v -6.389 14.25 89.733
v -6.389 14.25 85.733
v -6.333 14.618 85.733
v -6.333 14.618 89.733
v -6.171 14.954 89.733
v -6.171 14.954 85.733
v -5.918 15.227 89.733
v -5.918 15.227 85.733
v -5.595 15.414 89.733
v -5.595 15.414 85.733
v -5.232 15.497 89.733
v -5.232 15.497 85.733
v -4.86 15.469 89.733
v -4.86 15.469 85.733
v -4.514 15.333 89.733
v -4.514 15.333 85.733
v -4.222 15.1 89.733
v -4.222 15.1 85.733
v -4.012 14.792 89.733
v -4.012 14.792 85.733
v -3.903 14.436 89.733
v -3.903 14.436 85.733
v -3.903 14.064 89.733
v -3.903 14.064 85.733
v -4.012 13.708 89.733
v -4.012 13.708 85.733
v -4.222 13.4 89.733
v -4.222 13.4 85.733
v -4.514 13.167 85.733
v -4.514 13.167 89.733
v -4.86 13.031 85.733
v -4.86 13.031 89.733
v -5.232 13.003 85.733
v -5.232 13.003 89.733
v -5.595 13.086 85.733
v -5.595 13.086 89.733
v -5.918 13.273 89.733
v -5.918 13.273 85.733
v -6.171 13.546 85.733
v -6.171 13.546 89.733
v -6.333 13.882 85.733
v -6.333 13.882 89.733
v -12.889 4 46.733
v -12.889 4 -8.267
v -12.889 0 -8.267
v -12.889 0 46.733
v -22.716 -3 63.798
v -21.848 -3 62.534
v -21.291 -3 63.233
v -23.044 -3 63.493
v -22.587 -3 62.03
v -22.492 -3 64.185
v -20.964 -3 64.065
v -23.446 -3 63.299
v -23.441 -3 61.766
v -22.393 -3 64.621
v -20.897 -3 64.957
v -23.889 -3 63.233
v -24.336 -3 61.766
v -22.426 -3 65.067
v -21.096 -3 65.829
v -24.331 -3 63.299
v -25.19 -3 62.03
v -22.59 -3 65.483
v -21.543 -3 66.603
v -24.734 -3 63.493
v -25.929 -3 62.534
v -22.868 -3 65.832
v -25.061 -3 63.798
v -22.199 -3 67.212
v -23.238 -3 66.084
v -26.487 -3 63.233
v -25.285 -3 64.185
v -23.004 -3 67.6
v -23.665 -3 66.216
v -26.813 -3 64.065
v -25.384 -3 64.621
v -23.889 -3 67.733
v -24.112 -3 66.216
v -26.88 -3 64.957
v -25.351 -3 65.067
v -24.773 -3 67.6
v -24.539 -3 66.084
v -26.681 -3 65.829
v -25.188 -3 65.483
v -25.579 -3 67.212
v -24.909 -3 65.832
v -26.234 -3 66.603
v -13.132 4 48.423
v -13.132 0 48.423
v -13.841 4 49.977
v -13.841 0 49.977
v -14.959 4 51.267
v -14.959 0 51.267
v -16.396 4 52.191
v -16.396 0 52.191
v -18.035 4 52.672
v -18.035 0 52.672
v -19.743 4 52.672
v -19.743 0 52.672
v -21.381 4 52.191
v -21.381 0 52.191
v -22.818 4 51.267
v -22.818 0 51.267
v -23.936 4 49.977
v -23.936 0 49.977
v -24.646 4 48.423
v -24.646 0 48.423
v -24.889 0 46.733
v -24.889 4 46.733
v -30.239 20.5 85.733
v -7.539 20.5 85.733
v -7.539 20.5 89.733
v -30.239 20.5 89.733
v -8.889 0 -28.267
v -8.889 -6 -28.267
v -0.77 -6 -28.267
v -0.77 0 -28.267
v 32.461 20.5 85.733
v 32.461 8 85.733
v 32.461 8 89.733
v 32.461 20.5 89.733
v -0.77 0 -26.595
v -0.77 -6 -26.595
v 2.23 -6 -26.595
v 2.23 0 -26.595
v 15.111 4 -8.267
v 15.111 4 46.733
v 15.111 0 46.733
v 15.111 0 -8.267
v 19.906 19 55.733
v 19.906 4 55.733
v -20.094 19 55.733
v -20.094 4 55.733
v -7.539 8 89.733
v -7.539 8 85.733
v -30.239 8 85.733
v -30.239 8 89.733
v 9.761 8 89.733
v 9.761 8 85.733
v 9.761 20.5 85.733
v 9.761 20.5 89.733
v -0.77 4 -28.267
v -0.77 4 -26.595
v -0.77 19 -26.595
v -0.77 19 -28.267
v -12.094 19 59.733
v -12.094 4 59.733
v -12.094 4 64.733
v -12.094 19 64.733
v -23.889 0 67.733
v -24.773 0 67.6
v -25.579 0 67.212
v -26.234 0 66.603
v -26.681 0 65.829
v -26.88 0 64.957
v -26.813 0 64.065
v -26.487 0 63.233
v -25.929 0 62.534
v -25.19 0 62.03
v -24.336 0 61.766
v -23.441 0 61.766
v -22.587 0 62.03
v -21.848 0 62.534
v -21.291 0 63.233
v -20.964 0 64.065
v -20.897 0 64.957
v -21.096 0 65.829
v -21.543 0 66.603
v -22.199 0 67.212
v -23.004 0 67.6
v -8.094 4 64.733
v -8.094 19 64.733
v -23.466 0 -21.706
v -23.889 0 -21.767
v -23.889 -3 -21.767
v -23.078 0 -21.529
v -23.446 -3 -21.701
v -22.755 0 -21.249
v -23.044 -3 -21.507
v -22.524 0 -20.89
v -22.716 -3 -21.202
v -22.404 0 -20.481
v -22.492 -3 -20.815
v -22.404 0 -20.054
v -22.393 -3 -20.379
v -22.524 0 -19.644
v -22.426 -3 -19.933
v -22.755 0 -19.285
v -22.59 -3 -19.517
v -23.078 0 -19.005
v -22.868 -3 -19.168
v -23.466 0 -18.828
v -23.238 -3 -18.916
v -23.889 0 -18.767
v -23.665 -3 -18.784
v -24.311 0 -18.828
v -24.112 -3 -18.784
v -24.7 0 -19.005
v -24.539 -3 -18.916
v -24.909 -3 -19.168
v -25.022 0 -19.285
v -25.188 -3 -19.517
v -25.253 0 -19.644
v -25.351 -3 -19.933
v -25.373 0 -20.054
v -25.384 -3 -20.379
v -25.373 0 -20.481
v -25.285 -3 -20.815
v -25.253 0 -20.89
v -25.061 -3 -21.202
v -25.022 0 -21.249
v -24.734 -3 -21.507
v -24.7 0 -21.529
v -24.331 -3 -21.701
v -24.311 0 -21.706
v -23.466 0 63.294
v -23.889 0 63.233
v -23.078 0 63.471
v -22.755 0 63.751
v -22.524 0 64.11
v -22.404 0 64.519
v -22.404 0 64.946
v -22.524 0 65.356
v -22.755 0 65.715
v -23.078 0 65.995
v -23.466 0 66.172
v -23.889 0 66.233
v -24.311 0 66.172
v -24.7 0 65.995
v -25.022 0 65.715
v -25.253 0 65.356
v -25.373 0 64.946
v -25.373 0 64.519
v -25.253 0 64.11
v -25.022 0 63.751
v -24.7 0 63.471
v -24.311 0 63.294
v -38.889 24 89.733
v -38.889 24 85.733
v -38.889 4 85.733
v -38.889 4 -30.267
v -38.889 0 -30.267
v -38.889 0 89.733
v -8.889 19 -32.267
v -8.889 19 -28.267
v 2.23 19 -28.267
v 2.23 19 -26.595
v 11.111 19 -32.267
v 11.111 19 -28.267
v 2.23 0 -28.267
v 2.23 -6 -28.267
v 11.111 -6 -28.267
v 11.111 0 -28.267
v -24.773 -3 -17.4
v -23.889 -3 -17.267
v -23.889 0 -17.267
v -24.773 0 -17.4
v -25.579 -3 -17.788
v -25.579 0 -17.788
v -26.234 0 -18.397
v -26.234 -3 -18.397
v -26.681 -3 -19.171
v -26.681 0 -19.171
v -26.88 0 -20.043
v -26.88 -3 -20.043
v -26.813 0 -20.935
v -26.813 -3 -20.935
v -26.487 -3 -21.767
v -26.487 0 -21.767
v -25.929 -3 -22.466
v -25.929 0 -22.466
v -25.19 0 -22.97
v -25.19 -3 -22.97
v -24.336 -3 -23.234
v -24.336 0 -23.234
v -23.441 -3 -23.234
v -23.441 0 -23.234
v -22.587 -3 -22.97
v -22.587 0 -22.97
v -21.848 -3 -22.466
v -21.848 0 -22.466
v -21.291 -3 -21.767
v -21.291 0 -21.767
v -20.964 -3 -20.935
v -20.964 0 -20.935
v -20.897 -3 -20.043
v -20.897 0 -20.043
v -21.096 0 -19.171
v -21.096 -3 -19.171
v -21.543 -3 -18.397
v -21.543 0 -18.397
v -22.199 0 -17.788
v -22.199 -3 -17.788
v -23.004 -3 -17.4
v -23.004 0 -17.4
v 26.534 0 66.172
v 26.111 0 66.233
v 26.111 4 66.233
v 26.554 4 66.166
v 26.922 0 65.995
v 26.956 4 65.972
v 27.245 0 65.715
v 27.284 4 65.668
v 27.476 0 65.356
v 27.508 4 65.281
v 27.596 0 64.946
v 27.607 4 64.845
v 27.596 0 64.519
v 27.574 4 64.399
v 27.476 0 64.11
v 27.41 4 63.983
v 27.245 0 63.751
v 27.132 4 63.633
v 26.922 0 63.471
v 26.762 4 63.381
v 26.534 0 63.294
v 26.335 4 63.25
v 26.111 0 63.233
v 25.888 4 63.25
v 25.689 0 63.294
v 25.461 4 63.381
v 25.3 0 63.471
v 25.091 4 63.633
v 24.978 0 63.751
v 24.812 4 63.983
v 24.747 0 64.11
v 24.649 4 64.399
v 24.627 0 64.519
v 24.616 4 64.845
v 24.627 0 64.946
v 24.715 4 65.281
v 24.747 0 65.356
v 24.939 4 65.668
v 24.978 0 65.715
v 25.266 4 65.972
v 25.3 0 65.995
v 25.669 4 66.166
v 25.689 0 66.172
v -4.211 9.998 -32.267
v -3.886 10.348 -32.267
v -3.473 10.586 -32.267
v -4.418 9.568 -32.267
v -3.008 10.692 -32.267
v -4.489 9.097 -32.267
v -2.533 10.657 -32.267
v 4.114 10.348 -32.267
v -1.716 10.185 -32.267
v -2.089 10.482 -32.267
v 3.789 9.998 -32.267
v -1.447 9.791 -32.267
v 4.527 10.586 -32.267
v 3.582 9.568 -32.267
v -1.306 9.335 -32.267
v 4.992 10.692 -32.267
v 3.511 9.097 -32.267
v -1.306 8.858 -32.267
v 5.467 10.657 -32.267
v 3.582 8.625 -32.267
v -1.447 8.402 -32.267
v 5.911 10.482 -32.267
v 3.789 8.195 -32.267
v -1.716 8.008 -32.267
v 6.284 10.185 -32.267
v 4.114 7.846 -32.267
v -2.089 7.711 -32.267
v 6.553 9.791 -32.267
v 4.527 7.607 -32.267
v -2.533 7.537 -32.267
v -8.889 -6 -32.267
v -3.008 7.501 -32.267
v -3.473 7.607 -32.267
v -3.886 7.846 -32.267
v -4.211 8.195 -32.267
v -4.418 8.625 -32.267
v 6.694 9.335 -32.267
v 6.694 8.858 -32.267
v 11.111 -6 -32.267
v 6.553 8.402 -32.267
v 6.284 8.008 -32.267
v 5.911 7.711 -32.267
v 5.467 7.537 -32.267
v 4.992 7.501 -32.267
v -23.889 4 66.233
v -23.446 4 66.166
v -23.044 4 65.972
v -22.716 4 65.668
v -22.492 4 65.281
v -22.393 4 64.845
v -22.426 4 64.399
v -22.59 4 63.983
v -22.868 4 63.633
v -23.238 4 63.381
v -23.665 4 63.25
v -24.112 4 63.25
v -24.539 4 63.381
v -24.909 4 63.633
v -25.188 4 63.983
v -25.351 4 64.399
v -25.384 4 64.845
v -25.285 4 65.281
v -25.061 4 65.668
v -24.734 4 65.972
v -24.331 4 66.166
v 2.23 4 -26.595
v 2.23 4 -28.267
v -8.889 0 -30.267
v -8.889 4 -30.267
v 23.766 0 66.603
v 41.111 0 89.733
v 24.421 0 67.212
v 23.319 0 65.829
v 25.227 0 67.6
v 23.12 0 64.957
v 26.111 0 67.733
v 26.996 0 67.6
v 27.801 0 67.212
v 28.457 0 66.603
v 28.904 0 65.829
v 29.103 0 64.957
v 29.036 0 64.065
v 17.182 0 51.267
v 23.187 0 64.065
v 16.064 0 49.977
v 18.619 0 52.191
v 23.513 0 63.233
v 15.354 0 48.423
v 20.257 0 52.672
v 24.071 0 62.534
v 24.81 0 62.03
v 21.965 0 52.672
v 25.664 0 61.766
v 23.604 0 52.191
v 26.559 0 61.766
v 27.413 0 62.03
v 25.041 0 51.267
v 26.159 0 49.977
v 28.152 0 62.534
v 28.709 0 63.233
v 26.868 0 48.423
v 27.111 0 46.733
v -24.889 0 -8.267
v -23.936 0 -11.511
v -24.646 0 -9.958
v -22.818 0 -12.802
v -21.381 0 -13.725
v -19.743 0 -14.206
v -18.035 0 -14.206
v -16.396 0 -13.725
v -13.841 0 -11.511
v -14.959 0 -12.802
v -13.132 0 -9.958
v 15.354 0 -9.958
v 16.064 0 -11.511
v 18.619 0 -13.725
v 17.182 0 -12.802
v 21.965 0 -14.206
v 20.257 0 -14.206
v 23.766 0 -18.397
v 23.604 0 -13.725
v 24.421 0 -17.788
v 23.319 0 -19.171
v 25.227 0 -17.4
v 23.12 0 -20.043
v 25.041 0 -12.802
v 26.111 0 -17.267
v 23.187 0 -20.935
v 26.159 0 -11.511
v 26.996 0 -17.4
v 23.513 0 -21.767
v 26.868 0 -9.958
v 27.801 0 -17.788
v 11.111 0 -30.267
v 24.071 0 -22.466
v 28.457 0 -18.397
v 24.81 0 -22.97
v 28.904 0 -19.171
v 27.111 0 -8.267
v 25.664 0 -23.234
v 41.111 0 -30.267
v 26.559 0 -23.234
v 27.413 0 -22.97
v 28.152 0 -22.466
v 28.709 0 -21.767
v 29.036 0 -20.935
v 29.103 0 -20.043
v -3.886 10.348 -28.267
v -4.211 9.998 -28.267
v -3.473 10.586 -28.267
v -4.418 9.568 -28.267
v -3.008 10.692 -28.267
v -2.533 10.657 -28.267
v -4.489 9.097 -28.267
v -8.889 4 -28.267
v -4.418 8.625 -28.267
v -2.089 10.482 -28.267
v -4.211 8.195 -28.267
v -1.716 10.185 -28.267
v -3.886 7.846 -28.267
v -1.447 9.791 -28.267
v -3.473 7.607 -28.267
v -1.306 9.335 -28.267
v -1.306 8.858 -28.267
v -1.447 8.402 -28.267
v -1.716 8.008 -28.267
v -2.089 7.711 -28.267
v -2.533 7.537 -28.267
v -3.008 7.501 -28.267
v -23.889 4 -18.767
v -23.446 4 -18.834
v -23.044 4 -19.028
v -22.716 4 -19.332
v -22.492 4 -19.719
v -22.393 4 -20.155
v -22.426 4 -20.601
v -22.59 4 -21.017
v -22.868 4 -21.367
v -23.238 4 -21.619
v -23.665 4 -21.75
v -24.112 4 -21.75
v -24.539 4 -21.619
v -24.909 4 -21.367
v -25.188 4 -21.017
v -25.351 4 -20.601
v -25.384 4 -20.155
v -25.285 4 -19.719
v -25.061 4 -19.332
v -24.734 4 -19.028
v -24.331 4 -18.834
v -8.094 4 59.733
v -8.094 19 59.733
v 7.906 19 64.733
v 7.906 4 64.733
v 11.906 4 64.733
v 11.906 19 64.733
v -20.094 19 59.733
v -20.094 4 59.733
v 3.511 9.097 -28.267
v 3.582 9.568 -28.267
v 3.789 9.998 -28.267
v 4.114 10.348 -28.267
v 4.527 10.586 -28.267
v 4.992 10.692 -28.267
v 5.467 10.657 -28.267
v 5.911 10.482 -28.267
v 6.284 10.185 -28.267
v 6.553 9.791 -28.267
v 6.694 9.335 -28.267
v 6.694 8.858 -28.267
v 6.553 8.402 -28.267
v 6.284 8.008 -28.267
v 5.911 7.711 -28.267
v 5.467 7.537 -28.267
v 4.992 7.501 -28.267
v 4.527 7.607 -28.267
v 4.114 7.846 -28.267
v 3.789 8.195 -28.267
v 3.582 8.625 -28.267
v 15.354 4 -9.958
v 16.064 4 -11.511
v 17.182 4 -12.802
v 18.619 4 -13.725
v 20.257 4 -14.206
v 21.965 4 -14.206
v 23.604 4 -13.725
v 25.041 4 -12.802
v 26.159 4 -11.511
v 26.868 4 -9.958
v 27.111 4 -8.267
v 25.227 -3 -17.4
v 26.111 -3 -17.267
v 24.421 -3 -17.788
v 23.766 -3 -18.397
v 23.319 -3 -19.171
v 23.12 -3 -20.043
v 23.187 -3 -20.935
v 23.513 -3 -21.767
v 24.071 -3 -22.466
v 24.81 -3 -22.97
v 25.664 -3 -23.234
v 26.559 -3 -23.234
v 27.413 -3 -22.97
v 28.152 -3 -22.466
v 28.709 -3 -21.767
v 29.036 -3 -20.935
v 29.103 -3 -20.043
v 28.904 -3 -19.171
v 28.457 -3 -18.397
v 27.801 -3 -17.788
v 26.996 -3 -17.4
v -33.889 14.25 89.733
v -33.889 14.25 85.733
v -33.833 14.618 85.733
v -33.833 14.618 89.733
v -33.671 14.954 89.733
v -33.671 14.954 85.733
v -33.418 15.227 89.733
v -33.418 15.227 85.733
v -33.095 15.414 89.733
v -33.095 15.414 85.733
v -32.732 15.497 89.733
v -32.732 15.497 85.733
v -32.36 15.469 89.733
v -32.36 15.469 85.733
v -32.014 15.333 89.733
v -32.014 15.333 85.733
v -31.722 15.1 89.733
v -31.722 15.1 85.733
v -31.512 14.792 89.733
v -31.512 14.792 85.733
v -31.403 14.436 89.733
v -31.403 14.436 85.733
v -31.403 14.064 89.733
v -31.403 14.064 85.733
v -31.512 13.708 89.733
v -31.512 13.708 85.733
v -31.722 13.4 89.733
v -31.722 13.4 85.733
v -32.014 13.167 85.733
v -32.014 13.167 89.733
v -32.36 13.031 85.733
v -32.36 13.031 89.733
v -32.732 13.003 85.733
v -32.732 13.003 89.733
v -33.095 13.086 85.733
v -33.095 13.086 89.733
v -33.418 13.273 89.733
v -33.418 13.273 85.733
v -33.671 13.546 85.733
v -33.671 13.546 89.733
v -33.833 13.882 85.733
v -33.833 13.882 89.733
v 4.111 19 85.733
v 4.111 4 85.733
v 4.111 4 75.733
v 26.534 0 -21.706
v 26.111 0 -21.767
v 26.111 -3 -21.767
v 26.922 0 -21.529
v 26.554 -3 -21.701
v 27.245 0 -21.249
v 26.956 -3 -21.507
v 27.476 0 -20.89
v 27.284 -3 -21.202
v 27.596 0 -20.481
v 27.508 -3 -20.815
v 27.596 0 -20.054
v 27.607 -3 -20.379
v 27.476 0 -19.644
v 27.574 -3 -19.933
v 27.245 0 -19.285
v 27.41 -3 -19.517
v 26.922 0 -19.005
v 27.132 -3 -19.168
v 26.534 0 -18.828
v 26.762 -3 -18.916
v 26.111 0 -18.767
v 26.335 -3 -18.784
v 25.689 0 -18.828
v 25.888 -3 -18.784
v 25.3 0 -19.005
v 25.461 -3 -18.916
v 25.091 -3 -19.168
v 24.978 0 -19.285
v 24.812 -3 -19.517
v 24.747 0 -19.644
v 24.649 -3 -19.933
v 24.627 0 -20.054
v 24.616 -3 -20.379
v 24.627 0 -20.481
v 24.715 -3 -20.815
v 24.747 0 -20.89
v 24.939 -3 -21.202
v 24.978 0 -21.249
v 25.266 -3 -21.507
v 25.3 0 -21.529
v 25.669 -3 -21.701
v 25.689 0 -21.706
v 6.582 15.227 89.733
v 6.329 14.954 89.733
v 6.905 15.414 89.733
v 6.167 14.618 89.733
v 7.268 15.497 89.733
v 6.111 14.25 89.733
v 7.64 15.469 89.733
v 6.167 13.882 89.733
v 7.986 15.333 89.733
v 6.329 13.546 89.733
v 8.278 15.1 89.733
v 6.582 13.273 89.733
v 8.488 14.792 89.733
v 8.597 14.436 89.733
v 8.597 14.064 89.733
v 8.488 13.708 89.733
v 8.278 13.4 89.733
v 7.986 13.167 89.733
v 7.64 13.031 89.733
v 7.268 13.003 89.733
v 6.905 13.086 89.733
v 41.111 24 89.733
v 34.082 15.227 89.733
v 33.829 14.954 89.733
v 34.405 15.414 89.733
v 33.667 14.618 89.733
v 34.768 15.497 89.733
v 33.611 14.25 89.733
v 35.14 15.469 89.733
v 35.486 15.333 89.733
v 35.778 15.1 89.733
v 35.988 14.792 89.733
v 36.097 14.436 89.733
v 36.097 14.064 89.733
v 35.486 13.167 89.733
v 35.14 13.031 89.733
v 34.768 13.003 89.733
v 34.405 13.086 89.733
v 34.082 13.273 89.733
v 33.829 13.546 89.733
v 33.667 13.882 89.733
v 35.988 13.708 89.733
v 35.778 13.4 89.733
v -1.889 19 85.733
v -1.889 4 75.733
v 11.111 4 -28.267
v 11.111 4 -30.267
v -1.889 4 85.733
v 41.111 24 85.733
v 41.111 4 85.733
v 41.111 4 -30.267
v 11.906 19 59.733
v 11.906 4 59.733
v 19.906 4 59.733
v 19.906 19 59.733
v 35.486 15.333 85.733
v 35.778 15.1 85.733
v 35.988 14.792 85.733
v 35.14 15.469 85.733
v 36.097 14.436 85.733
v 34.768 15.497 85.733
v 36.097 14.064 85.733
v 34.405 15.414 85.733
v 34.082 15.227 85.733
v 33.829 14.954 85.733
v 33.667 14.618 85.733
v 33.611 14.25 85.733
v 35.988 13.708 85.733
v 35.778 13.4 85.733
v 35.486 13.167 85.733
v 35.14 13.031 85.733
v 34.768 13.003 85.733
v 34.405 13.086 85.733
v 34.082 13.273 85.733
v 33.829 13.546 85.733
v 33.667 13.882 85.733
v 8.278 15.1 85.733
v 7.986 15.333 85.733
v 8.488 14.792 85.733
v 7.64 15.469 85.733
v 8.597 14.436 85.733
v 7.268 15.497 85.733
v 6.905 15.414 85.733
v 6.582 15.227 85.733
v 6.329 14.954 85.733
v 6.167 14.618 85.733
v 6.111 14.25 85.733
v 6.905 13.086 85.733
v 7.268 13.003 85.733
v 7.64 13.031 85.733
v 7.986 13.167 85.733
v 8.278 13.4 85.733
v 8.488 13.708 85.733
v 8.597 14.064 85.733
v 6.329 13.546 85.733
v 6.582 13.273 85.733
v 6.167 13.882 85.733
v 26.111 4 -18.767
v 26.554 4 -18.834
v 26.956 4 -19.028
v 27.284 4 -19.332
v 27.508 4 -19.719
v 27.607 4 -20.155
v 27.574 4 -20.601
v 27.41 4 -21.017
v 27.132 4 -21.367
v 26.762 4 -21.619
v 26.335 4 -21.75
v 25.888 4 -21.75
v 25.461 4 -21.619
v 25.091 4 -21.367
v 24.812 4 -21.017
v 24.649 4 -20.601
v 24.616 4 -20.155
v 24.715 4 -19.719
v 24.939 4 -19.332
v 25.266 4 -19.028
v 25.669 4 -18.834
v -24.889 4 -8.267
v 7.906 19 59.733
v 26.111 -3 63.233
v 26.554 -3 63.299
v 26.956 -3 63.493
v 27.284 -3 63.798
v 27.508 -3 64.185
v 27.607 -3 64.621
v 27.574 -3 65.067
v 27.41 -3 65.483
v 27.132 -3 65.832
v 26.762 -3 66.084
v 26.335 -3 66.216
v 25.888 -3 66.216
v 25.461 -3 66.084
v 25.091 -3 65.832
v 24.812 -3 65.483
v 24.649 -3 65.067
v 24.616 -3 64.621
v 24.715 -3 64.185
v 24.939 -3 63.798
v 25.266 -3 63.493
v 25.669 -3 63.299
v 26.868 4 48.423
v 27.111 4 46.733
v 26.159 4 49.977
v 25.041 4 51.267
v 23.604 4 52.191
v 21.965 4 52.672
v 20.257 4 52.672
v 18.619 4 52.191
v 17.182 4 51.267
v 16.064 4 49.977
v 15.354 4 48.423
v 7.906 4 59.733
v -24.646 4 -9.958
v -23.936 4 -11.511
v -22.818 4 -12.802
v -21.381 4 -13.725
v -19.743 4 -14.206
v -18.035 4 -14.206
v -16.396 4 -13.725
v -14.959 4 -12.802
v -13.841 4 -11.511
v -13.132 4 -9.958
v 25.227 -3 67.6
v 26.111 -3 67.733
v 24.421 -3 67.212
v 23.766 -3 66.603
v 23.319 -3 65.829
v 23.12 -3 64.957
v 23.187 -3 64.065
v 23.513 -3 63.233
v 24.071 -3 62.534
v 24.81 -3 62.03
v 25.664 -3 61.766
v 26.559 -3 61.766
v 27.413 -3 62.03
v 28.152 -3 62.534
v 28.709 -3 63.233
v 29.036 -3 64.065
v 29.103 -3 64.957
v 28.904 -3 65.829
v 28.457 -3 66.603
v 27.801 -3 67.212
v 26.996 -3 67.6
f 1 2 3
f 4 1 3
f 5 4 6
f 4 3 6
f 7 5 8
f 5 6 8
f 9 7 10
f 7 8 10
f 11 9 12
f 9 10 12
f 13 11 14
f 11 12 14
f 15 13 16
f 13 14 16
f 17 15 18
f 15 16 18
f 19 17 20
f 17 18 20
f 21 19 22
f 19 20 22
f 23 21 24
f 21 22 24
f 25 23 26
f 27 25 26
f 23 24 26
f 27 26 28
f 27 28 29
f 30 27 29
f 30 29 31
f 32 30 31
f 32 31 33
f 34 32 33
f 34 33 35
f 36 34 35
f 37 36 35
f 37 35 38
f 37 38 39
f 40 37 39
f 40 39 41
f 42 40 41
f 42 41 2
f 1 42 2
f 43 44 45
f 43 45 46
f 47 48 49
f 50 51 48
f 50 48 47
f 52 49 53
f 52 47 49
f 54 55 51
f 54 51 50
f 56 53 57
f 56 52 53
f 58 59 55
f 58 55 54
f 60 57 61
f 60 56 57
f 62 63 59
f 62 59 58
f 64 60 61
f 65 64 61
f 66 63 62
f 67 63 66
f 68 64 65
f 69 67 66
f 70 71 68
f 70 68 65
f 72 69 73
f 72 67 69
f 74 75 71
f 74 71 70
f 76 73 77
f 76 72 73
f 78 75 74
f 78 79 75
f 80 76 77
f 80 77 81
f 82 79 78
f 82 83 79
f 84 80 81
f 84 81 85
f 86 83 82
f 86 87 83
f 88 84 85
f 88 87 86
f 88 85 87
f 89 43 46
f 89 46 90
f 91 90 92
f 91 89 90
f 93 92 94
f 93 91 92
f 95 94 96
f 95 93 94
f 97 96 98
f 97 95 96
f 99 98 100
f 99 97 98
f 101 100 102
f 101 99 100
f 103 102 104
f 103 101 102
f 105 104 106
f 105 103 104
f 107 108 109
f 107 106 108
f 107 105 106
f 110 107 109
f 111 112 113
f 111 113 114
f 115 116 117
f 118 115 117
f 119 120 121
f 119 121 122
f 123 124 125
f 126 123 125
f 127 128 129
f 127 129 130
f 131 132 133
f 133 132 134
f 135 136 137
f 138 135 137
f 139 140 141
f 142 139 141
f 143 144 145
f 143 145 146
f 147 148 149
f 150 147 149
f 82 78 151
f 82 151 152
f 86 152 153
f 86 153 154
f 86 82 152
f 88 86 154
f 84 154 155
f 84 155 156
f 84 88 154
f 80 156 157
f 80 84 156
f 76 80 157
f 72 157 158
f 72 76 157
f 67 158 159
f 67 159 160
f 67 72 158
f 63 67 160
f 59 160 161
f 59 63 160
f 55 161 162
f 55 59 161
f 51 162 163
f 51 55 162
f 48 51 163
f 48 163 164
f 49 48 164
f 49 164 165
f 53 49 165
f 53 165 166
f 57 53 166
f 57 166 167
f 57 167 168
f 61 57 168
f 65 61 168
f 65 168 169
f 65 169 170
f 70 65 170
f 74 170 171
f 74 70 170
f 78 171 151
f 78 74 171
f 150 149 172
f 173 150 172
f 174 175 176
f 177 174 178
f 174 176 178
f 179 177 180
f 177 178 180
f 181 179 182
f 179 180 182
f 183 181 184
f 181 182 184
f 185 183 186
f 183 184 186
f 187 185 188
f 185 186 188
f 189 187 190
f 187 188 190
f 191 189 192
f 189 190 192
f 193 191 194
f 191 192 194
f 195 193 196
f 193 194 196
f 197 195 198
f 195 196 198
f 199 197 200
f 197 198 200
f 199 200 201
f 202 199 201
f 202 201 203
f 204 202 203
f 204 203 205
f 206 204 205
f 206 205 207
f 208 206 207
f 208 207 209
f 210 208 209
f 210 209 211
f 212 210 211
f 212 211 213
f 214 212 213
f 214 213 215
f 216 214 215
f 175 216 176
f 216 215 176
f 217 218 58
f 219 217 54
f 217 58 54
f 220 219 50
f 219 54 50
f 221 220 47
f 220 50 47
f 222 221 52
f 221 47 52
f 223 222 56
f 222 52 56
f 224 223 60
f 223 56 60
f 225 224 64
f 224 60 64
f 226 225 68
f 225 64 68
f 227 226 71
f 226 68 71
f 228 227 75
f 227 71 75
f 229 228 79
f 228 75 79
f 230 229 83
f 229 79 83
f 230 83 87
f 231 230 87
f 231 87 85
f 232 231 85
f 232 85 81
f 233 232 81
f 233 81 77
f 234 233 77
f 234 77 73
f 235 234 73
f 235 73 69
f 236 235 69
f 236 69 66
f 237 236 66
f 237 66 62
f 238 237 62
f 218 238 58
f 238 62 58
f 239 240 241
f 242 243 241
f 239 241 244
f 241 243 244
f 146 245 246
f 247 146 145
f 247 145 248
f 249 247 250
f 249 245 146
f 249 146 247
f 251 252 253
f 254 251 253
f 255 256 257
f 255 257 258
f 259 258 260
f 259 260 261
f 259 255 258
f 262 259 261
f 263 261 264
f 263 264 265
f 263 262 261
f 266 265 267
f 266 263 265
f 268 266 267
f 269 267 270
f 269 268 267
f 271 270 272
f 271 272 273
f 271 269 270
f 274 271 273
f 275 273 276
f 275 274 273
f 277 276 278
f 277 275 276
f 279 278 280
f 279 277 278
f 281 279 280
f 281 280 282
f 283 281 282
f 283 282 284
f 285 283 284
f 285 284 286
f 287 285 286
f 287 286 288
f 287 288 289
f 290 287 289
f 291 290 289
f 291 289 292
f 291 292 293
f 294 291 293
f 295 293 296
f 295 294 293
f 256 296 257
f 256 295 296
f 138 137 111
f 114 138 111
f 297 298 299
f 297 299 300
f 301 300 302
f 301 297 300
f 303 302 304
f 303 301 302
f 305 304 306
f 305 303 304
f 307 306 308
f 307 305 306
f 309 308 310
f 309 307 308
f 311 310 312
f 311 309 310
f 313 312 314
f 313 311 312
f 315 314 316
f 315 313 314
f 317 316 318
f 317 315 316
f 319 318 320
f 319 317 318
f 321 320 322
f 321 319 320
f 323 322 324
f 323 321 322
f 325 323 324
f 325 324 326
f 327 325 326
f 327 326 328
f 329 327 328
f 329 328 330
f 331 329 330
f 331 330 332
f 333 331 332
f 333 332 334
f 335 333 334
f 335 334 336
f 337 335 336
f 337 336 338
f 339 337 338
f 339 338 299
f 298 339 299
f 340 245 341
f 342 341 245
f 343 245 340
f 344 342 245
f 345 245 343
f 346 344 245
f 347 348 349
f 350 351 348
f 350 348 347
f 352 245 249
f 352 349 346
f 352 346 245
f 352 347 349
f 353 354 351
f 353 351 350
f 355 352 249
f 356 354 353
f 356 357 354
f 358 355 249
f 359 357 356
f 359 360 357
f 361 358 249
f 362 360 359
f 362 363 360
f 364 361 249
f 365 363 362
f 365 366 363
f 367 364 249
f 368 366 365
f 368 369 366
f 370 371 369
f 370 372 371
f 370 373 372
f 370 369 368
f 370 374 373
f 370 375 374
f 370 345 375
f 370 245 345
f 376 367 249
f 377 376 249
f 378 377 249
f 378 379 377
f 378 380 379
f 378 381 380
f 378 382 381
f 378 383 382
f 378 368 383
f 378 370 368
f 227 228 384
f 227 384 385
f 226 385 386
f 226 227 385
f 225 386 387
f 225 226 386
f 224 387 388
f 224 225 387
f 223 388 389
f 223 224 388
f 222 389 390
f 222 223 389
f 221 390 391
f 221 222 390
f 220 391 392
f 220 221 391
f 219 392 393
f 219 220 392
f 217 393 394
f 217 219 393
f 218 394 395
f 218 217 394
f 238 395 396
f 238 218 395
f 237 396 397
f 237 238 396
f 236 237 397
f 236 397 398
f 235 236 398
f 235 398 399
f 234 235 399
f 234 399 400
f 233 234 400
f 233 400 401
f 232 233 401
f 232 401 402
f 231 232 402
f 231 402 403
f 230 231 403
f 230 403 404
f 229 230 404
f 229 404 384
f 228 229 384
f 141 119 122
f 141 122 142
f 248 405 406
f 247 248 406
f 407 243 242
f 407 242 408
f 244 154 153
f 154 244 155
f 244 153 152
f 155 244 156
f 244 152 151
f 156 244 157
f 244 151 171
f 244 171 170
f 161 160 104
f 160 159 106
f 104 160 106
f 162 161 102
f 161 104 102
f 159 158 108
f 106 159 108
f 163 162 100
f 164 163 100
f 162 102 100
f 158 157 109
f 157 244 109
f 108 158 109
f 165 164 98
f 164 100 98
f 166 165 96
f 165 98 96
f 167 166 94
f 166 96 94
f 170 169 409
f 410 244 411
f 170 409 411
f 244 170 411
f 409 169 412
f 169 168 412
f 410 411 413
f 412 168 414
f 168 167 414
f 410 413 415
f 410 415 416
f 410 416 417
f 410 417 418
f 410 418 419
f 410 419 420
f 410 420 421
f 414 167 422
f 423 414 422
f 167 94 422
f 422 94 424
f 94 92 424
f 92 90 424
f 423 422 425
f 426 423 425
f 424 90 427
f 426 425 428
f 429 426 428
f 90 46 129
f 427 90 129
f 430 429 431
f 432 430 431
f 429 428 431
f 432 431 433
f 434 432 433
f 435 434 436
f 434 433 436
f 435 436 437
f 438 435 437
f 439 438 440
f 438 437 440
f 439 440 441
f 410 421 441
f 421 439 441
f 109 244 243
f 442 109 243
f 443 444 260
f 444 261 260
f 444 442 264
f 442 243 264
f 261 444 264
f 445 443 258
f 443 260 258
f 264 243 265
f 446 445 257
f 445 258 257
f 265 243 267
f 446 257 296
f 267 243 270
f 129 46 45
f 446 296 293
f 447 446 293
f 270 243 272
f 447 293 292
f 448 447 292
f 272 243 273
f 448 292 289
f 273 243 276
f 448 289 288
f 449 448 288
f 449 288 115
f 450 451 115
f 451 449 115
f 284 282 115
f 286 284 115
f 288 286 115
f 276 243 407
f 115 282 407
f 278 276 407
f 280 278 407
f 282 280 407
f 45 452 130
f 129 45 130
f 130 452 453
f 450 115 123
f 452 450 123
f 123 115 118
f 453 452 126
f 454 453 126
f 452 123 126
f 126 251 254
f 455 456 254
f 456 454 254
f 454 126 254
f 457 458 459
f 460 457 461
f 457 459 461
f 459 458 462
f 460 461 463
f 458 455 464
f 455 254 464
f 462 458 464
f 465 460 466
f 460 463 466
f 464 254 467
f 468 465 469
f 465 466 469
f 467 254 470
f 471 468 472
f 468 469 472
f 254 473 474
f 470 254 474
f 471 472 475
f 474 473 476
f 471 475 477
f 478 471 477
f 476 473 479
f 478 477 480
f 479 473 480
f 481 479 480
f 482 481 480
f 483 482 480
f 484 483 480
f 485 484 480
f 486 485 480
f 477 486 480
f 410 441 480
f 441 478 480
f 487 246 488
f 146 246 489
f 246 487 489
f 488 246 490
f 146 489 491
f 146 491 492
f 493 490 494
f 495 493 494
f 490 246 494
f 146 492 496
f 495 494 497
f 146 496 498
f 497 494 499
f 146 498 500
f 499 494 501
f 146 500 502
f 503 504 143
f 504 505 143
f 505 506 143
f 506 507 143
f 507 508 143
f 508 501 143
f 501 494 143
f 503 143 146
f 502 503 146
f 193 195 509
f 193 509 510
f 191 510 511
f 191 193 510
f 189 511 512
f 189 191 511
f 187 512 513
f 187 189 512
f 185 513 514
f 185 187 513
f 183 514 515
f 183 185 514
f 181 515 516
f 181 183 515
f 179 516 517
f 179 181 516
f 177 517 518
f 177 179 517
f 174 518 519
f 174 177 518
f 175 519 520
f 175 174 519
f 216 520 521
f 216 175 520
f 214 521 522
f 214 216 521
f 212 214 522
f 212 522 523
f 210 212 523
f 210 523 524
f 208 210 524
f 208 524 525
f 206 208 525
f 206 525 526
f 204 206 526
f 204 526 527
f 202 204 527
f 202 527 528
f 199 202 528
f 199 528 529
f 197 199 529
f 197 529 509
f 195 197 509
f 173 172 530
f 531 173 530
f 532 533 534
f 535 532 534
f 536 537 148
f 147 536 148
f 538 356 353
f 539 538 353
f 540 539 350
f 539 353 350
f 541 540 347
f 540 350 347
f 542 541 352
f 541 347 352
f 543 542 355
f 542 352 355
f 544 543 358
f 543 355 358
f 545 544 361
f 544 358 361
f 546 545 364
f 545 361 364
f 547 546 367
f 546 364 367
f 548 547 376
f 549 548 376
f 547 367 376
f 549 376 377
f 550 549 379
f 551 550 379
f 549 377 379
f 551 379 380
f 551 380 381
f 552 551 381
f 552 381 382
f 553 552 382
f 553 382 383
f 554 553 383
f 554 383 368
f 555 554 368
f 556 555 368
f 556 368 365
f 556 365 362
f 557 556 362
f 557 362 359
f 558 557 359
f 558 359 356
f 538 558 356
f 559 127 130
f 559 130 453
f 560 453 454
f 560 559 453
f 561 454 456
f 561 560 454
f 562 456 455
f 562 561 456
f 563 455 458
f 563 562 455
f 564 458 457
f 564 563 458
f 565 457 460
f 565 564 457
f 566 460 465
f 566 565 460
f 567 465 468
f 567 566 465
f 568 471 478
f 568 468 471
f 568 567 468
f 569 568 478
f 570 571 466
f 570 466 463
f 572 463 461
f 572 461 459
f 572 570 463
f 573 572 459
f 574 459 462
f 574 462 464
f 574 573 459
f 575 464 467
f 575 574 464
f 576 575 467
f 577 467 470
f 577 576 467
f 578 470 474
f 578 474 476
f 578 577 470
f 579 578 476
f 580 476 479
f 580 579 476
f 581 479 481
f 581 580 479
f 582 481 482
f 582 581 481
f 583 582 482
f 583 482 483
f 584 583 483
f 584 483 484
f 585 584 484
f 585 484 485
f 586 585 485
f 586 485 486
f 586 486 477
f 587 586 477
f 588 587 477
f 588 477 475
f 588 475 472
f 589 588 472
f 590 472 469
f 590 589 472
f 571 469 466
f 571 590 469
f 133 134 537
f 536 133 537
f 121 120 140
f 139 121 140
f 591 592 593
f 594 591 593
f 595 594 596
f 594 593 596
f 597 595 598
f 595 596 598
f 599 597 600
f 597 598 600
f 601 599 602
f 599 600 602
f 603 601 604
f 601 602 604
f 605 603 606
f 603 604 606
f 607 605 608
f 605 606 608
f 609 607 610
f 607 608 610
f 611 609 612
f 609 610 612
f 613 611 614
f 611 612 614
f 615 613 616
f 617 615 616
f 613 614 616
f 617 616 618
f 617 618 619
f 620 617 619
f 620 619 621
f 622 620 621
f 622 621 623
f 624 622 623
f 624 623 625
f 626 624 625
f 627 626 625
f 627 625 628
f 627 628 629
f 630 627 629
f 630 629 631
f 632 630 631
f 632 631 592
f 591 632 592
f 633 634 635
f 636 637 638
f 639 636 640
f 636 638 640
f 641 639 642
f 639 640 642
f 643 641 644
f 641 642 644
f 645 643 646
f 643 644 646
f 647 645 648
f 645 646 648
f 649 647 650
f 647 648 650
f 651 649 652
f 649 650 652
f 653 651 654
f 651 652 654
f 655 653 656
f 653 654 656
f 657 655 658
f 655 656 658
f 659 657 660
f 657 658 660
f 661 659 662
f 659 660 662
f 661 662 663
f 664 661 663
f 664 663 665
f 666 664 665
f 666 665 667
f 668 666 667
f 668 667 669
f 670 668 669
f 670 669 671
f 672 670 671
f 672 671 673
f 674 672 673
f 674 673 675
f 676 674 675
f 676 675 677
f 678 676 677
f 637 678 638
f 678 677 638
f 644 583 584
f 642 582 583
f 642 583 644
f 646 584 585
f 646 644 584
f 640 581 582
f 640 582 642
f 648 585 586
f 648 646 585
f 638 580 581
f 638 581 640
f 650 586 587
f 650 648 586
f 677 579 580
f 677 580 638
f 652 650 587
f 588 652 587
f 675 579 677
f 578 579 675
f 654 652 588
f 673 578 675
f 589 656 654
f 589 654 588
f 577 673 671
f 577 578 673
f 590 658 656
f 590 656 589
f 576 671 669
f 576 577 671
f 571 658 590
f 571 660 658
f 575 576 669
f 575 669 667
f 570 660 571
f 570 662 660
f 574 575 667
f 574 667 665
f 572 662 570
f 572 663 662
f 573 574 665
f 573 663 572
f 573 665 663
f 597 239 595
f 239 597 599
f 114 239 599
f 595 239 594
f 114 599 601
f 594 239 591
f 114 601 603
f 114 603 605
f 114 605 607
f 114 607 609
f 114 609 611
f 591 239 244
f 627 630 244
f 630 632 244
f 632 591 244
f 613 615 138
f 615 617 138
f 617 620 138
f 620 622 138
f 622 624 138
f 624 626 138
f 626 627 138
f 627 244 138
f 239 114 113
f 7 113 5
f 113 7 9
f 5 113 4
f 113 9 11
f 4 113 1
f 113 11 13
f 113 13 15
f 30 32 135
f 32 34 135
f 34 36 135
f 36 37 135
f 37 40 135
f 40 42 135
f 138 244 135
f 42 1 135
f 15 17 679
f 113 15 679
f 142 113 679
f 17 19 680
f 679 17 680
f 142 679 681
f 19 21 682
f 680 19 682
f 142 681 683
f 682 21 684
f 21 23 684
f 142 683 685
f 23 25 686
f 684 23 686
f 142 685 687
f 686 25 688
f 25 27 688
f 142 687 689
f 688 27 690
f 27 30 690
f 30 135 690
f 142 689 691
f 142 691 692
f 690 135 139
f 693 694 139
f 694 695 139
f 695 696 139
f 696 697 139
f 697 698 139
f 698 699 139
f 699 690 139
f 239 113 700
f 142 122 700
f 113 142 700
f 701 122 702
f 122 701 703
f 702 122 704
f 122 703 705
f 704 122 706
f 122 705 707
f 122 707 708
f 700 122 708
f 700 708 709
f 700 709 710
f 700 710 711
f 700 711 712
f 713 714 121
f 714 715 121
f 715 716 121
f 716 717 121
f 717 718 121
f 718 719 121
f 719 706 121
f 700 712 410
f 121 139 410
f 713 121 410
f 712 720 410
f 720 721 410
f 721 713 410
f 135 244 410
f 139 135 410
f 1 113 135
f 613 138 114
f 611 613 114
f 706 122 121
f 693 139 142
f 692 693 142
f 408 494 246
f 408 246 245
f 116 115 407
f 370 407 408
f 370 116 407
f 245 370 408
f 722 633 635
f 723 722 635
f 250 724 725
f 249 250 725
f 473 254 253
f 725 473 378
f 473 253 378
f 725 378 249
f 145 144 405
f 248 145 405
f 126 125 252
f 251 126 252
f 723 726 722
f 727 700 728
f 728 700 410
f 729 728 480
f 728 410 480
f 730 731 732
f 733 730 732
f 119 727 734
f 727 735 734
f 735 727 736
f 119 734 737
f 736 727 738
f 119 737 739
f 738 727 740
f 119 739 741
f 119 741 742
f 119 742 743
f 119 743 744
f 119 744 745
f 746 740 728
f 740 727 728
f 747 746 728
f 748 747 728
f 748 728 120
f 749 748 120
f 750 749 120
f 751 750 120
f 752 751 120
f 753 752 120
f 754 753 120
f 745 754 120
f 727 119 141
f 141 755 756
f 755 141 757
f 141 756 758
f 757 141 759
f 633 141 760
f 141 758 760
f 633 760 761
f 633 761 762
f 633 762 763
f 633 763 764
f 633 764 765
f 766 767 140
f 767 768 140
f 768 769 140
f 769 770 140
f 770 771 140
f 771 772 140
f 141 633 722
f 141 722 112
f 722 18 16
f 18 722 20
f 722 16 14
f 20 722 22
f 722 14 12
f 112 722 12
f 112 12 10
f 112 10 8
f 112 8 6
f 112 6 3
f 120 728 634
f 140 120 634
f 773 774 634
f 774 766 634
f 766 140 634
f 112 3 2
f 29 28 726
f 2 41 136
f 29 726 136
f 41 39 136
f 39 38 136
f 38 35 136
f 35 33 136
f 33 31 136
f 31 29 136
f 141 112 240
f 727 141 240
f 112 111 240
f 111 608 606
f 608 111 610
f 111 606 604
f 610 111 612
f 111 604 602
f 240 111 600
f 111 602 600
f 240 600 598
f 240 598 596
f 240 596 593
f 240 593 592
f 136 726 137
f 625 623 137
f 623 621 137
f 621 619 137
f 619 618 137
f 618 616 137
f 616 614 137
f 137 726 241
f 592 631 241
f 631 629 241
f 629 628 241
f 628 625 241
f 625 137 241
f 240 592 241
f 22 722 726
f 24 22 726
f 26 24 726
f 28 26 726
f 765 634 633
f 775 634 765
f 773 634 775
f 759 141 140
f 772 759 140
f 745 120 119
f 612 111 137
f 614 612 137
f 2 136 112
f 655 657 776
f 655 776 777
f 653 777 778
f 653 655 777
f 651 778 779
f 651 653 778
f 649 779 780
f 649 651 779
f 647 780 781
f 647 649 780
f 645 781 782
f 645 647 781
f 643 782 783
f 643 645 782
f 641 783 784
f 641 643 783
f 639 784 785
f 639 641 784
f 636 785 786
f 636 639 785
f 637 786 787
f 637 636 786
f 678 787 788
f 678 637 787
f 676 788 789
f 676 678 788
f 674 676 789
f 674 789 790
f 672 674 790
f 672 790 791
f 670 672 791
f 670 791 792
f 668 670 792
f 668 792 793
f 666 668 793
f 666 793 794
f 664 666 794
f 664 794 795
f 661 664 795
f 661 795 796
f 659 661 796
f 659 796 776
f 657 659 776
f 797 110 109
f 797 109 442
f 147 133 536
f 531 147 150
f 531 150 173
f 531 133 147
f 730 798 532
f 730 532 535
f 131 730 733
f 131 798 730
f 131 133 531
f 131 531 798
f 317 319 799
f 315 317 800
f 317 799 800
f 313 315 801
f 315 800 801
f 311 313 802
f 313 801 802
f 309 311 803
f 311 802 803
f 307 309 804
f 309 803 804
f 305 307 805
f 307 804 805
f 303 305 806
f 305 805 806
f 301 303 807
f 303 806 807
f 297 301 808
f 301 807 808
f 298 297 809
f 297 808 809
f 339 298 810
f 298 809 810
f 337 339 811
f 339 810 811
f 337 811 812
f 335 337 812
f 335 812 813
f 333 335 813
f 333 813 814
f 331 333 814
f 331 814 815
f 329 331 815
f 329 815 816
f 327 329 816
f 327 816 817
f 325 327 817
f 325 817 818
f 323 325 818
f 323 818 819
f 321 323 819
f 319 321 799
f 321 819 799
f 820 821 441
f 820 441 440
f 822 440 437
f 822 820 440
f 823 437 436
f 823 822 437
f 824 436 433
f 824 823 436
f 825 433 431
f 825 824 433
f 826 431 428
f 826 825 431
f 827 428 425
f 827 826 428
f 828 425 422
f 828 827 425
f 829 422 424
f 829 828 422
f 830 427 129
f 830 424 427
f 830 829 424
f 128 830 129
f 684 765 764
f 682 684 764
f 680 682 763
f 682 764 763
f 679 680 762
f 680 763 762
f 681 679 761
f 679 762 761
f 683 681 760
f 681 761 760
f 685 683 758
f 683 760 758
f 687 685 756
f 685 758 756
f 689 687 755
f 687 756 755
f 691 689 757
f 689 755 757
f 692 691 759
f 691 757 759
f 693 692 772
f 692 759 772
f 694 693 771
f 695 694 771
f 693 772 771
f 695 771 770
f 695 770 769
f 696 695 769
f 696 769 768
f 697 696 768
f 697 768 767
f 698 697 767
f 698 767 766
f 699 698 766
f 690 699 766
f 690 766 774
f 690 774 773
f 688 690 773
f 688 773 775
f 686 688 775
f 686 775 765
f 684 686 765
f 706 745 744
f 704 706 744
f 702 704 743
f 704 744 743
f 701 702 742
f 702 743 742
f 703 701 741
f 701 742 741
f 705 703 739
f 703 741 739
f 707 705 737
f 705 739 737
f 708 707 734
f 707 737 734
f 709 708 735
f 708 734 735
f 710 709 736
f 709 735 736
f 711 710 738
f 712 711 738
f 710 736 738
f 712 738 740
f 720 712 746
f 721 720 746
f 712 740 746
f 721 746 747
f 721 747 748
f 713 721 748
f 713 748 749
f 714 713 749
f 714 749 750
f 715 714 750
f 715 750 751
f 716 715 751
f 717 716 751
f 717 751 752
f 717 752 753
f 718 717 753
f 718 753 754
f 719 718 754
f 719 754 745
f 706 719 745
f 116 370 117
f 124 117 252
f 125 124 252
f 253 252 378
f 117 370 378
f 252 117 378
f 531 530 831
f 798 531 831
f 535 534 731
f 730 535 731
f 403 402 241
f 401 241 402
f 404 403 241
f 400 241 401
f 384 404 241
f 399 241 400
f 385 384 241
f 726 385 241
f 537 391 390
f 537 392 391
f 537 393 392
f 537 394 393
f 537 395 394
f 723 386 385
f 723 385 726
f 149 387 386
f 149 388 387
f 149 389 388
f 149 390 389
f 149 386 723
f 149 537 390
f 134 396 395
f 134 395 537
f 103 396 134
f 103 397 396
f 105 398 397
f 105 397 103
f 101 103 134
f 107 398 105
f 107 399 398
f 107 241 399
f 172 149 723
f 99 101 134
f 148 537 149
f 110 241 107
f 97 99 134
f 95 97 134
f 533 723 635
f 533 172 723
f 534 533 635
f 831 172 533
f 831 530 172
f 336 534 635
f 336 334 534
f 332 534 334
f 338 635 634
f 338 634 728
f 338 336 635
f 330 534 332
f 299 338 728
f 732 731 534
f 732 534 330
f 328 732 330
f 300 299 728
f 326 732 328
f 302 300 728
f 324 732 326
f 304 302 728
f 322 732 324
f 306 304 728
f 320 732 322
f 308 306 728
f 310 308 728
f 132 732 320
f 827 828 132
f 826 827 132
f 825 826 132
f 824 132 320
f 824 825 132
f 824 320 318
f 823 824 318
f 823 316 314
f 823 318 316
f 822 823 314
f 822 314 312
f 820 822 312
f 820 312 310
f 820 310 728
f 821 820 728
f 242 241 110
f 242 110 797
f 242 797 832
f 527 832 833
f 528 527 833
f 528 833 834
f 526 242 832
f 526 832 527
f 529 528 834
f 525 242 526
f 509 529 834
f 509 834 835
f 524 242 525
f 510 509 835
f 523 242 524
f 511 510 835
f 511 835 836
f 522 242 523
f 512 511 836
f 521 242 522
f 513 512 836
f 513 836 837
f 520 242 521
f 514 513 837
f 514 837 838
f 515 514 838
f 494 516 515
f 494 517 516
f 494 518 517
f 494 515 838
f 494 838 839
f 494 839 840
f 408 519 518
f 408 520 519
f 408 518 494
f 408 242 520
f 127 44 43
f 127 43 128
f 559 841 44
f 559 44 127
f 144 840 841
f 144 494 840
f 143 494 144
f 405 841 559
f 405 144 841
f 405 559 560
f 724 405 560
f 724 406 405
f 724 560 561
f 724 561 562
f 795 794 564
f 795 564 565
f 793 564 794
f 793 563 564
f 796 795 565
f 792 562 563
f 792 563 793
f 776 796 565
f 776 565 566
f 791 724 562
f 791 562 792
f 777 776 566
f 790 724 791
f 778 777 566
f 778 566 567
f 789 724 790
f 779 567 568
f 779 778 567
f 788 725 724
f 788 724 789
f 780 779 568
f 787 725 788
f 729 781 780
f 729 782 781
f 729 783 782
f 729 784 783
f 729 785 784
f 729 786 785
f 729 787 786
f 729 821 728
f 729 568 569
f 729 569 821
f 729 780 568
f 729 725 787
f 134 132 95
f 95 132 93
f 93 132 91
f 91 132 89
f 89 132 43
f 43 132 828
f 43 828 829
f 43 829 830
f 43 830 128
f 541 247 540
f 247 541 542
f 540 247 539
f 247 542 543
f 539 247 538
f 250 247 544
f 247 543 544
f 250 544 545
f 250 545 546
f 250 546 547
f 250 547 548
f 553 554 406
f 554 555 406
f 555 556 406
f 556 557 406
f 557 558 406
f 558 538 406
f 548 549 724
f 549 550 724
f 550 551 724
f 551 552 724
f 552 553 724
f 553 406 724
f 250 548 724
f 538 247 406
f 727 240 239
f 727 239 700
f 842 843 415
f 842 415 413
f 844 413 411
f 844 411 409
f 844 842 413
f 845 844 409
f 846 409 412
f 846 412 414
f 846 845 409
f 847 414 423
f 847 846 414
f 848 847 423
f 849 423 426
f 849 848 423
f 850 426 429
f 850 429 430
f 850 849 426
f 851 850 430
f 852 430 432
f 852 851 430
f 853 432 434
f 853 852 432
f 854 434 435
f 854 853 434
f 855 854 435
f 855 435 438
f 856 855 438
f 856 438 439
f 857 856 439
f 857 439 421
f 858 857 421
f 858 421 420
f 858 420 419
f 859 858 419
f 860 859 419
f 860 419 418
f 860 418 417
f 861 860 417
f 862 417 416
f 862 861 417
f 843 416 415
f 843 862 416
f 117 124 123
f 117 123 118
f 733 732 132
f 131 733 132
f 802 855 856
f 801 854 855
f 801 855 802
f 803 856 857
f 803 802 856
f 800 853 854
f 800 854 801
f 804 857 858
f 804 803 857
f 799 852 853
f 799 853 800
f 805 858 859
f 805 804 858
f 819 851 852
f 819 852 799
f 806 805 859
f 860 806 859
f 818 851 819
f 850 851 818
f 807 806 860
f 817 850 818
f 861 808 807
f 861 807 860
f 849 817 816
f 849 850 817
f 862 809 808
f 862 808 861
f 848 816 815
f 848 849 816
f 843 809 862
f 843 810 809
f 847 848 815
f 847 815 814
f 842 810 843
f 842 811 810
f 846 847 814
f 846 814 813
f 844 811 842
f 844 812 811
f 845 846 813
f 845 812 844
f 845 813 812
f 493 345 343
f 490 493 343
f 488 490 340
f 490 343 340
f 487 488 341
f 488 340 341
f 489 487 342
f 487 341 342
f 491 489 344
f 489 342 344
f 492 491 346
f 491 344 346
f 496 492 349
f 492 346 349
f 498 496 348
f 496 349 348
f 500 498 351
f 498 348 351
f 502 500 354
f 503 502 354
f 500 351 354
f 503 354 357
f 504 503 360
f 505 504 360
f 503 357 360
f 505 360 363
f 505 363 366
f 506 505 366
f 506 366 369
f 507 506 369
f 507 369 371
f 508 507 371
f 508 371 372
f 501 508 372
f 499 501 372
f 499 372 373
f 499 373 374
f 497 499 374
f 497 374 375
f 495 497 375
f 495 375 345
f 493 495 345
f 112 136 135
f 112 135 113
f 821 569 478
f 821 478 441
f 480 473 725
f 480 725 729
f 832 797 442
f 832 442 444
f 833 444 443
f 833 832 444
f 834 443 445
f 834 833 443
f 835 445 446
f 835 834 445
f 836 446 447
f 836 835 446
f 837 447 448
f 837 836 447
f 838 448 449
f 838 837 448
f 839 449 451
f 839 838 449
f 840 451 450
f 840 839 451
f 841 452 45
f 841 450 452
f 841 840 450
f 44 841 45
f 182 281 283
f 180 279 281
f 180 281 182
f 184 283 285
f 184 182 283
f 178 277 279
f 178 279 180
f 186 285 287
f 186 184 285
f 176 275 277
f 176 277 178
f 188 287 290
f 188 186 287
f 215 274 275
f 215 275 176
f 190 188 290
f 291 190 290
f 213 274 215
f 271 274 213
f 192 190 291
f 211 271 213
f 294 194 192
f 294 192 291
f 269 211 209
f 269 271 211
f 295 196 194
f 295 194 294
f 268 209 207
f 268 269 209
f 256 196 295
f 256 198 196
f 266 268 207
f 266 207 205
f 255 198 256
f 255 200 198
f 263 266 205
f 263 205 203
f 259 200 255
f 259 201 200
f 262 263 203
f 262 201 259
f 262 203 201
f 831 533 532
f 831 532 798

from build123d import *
from build123d.topology import SkipClean

# Parameters (mm, degrees)
SKETCH_1_W           = 80
SKETCH_1_H           = 120
SKETCH_1_R           = 1.5
EXTRUDE_2_DEPTH      = 4
SKETCH_4_W           = 4
SKETCH_4_H           = 10
EXTRUDE_4_DEPTH      = 20
EXTRUDE_5_DEPTH      = 15
EXTRUDE_5_DEPTH_BACK = 10
SKETCH_5_W           = 20
SKETCH_5_H           = 4
CUT_EXTRUDE_1_REACH  = 132.959
SKETCH_6_R           = 1.6
CUT_EXTRUDE_START    = -50
CUT_EXTRUDE_3_DEPTH  = 50
EXTRUDE_7_DEPTH      = 15
EXTRUDE_7_DEPTH_BACK = 10
SKETCH_10_W          = 3
SKETCH_10_H          = 3
SKETCH_11_W          = 4
SKETCH_11_H          = 5
EXTRUDE_9_DEPTH      = 15
CUT_EXTRUDE_5_REACH  = 102.708
CUT_EXTRUDE_6_REACH  = 129.241
SKETCH_13_R          = 1.25
SKETCH_13_W          = 22.7
SKETCH_13_H          = 12.5
CUT_EXTRUDE_7_DEPTH  = 114.370984798
SKETCH_15_W          = 6
SKETCH_15_H          = 10
EXTRUDE_10_DEPTH     = 15
CUT_EXTRUDE_8_REACH  = 104.357
EXTRUDE_START        = 3
SKETCH_17_R          = 3
SKETCH_17_R_2        = 1.5
EXTRUDE_11_DEPTH     = 3


with BuildPart() as part:
    # 草图1 → 凸台-拉伸2 (new body)
    with BuildSketch(Plane(origin=(0, 0, 0), x_dir=(1, 0, 0), z_dir=(0, 1, 0))):
        with Locations((1.11138133, -29.732826736)):
            Rectangle(SKETCH_1_W, SKETCH_1_H)
        with Locations(Location((-23.88861867, 20.267173264, 0), (0, 0, 270))):
            Circle(SKETCH_1_R, mode=Mode.SUBTRACT)
        with Locations(Location((26.11138133, 20.267173264, 0), (0, 0, 270))):
            Circle(SKETCH_1_R, mode=Mode.SUBTRACT)
        with Locations(Location((-23.88861867, -64.732826736, 0), (0, 0, 270))):
            Circle(SKETCH_1_R, mode=Mode.SUBTRACT)
        with Locations(Location((26.11138133, -64.732826736, 0), (0, 0, 270))):
            Circle(SKETCH_1_R, mode=Mode.SUBTRACT)
    extrude(amount=EXTRUDE_2_DEPTH)

    # 草图4 → 凸台-拉伸4 (add)
    with BuildSketch(Plane(origin=(0, 4, 0), x_dir=(1, 0, 0), z_dir=(0, 1, 0))):
        Polygon((-38.88861867, -85.732826736), (-38.88861867, -89.732826736), (41.11138133, -89.732826736), (41.11138133, -85.732826736), (26.11138133, -85.732826736), (22.11138133, -85.732826736), (-19.88861867, -85.732826736), (-23.88861867, -85.732826736), align=None)
        with Locations((24.11138133, -80.732826736)):
            Rectangle(SKETCH_4_W, SKETCH_4_H)
        with Locations((-21.88861867, -80.732826736)):
            Rectangle(SKETCH_4_W, SKETCH_4_H)
    extrude(amount=EXTRUDE_4_DEPTH)

    # 草图5 → 凸台-拉伸5 (add, two sides: drawn at the far end of the back side and taken through both)
    with BuildSketch(Plane(origin=(0, 4, 0), x_dir=(1, 0, 0), z_dir=(0, 1, 0)).offset(-EXTRUDE_5_DEPTH_BACK)):
        with Locations((1.11138133, 30.267173264)):
            Rectangle(SKETCH_5_W, SKETCH_5_H)
    extrude(amount=EXTRUDE_5_DEPTH + EXTRUDE_5_DEPTH_BACK)

    # 草图6 → 切除-拉伸1 (cut, up to next)
    with BuildSketch(Plane(origin=(0, 0, -32.267173264), x_dir=(-1, 0, 0), z_dir=(0, 0, -1)), mode=Mode.PRIVATE) as cut_extrude_1_sk1:
        with Locations((2.88861867, 9.096659339)):
            Circle(SKETCH_6_R)
    cut_extrude_1_tool1 = extrude(cut_extrude_1_sk1.sketch, amount=-CUT_EXTRUDE_1_REACH, mode=Mode.PRIVATE) & part.part
    # 草图6 → 切除-拉伸1 (cut, up to next)
    with BuildSketch(Plane(origin=(0, 0, -32.267173264), x_dir=(-1, 0, 0), z_dir=(0, 0, -1)), mode=Mode.PRIVATE) as cut_extrude_1_sk2:
        with Locations((-5.11138133, 9.096659339)):
            Circle(SKETCH_6_R)
    cut_extrude_1_tool2 = extrude(cut_extrude_1_sk2.sketch, amount=-CUT_EXTRUDE_1_REACH, mode=Mode.PRIVATE) & part.part
    add(cut_extrude_1_tool1.solids().sort_by_distance((-2.888619, 9.096659, -32.267173))[0], mode=Mode.SUBTRACT)
    add(cut_extrude_1_tool2.solids().sort_by_distance((5.111381, 9.096659, -32.267173))[0], mode=Mode.SUBTRACT)

    # 草图9 → 切除-拉伸3 (cut)
    with BuildSketch(Plane.ZY.offset(23.88861867).offset(CUT_EXTRUDE_START)):
        Polygon((75.732826736, 24), (75.732826736, 4), (85.732826736, 14), (85.732826736, 24), align=None)
    extrude(amount=CUT_EXTRUDE_3_DEPTH, mode=Mode.SUBTRACT)

    # 草图10 → 凸台-拉伸7 (add, two sides: drawn at the far end of the back side and taken through both)
    with BuildSketch(Plane(origin=(0, 4, 0), x_dir=(1, 0, 0), z_dir=(0, 1, 0)).offset(-EXTRUDE_7_DEPTH_BACK)):
        with Locations((0.730413479, 28.094677972)):
            Rectangle(SKETCH_10_W, SKETCH_10_H)
    extrude(amount=EXTRUDE_7_DEPTH + EXTRUDE_7_DEPTH_BACK)

    # 草图11 → 凸台-拉伸9 (add)
    with BuildSketch(Plane(origin=(0, 4, 0), x_dir=(1, 0, 0), z_dir=(0, 1, 0))):
        Polygon((19.905778303, -55.732826736), (-20.094221697, -55.732826736), (-20.094221697, -59.732826736), (-12.422102113, -59.732826736), (-12.094221697, -59.732826736), (-9.202998314, -59.732826736), (-8.094221697, -59.732826736), (7.905778303, -59.732826736), (11.905778303, -59.732826736), (19.905778303, -59.732826736), align=None)
        Polygon((-9.202998314, -59.732826736), (-12.094221697, -59.732826736), (-12.094221697, -64.732826736), (-8.094221697, -64.732826736), (-8.094221697, -59.732826736), align=None)
        with Locations((9.905778303, -62.232826736)):
            Rectangle(SKETCH_11_W, SKETCH_11_H)
    extrude(amount=EXTRUDE_9_DEPTH)

    # 草图12 → 切除-拉伸5 (cut, up to next)
    with BuildSketch(Plane(origin=(0, 4, 0), x_dir=(1, 0, 0), z_dir=(0, 1, 0)), mode=Mode.PRIVATE) as cut_extrude_5_sk1:
        with BuildLine():
            Line((27.11138133, 8.267173264), (27.11138133, -46.732826736))
            ThreePointArc((27.11138133, -46.732826736), (21.11138133, -52.732826736), (15.11138133, -46.732826736))
            Line((15.11138133, -46.732826736), (15.11138133, 8.267173264))
            ThreePointArc((15.11138133, 8.267173264), (21.11138133, 14.267173264), (27.11138133, 8.267173264))
        make_face()
    cut_extrude_5_tool1 = extrude(cut_extrude_5_sk1.sketch, amount=-CUT_EXTRUDE_5_REACH, mode=Mode.PRIVATE) & part.part
    # 草图12 → 切除-拉伸5 (cut, up to next)
    with BuildSketch(Plane(origin=(0, 4, 0), x_dir=(1, 0, 0), z_dir=(0, 1, 0)), mode=Mode.PRIVATE) as cut_extrude_5_sk2:
        with BuildLine():
            Line((-12.88861867, 8.267173264), (-12.88861867, -46.732826736))
            ThreePointArc((-12.88861867, -46.732826736), (-18.88861867, -52.732826736), (-24.88861867, -46.732826736))
            Line((-24.88861867, -46.732826736), (-24.88861867, 8.267173264))
            ThreePointArc((-24.88861867, 8.267173264), (-18.88861867, 14.267173264), (-12.88861867, 8.267173264))
        make_face()
    cut_extrude_5_tool2 = extrude(cut_extrude_5_sk2.sketch, amount=-CUT_EXTRUDE_5_REACH, mode=Mode.PRIVATE) & part.part
    add(cut_extrude_5_tool1.solids().sort_by_distance((21.111381, 4, 19.232827))[0], mode=Mode.SUBTRACT)
    add(cut_extrude_5_tool2.solids().sort_by_distance((-18.888619, 4, 19.232827))[0], mode=Mode.SUBTRACT)

    # 草图13 → 切除-拉伸6 (cut, up to next)
    with BuildSketch(Plane(origin=(0, 0, 85.732826736), x_dir=(-1, 0, 0), z_dir=(0, 0, -1)), mode=Mode.PRIVATE) as cut_extrude_6_sk1:
        with Locations((-34.86138133, 14.25)):
            Circle(SKETCH_13_R)
    cut_extrude_6_tool1 = extrude(cut_extrude_6_sk1.sketch, amount=-CUT_EXTRUDE_6_REACH, mode=Mode.PRIVATE) & part.part
    # 草图13 → 切除-拉伸6 (cut, up to next)
    with BuildSketch(Plane(origin=(0, 0, 85.732826736), x_dir=(-1, 0, 0), z_dir=(0, 0, -1)), mode=Mode.PRIVATE) as cut_extrude_6_sk2:
        with Locations((-7.36138133, 14.25)):
            Circle(SKETCH_13_R)
    cut_extrude_6_tool2 = extrude(cut_extrude_6_sk2.sketch, amount=-CUT_EXTRUDE_6_REACH, mode=Mode.PRIVATE) & part.part
    # 草图13 → 切除-拉伸6 (cut, up to next)
    with BuildSketch(Plane(origin=(0, 0, 85.732826736), x_dir=(-1, 0, 0), z_dir=(0, 0, -1)), mode=Mode.PRIVATE) as cut_extrude_6_sk3:
        with Locations((5.13861867, 14.25)):
            Circle(SKETCH_13_R)
    cut_extrude_6_tool3 = extrude(cut_extrude_6_sk3.sketch, amount=-CUT_EXTRUDE_6_REACH, mode=Mode.PRIVATE) & part.part
    # 草图13 → 切除-拉伸6 (cut, up to next)
    with BuildSketch(Plane(origin=(0, 0, 85.732826736), x_dir=(-1, 0, 0), z_dir=(0, 0, -1)), mode=Mode.PRIVATE) as cut_extrude_6_sk4:
        with Locations((32.63861867, 14.25)):
            Circle(SKETCH_13_R)
    cut_extrude_6_tool4 = extrude(cut_extrude_6_sk4.sketch, amount=-CUT_EXTRUDE_6_REACH, mode=Mode.PRIVATE) & part.part
    # 草图13 → 切除-拉伸6 (cut, up to next)
    with BuildSketch(Plane(origin=(0, 0, 85.732826736), x_dir=(-1, 0, 0), z_dir=(0, 0, -1)), mode=Mode.PRIVATE) as cut_extrude_6_sk5:
        with Locations((-21.11138133, 14.25)):
            Rectangle(SKETCH_13_W, SKETCH_13_H)
    cut_extrude_6_tool5 = extrude(cut_extrude_6_sk5.sketch, amount=-CUT_EXTRUDE_6_REACH, mode=Mode.PRIVATE) & part.part
    # 草图13 → 切除-拉伸6 (cut, up to next)
    with BuildSketch(Plane(origin=(0, 0, 85.732826736), x_dir=(-1, 0, 0), z_dir=(0, 0, -1)), mode=Mode.PRIVATE) as cut_extrude_6_sk6:
        with Locations((18.88861867, 14.25)):
            Rectangle(SKETCH_13_W, SKETCH_13_H)
    cut_extrude_6_tool6 = extrude(cut_extrude_6_sk6.sketch, amount=-CUT_EXTRUDE_6_REACH, mode=Mode.PRIVATE) & part.part
    add(cut_extrude_6_tool1.solids().sort_by_distance((34.861381, 14.25, 85.732827))[0], mode=Mode.SUBTRACT)
    add(cut_extrude_6_tool2.solids().sort_by_distance((7.361381, 14.25, 85.732827))[0], mode=Mode.SUBTRACT)
    add(cut_extrude_6_tool3.solids().sort_by_distance((-5.138619, 14.25, 85.732827))[0], mode=Mode.SUBTRACT)
    add(cut_extrude_6_tool4.solids().sort_by_distance((-32.638619, 14.25, 85.732827))[0], mode=Mode.SUBTRACT)
    add(cut_extrude_6_tool5.solids().sort_by_distance((21.111381, 14.25, 85.732827))[0], mode=Mode.SUBTRACT)
    add(cut_extrude_6_tool6.solids().sort_by_distance((-18.888619, 14.25, 85.732827))[0], mode=Mode.SUBTRACT)

    # 草图14 → 切除-拉伸7 (cut, through all)
    with BuildSketch(Plane(origin=(26.11138133, 0, 0), x_dir=(0, 0, -1), z_dir=(1, 0, 0))):
        Polygon((-85.732826736, 4), (-75.732826736, 4), (-85.732826736, 14), (-85.732826736, 8), align=None)
    extrude(amount=-CUT_EXTRUDE_7_DEPTH, mode=Mode.SUBTRACT)

    # 草图15 → 凸台-拉伸10 (add)
    with BuildSketch(Plane(origin=(0, 4, 0), x_dir=(1, 0, 0), z_dir=(0, 1, 0))):
        with Locations((1.11138133, -80.732826736)):
            Rectangle(SKETCH_15_W, SKETCH_15_H)
    extrude(amount=EXTRUDE_10_DEPTH)

    # 草图16 → 切除-拉伸8 (cut, up to next)
    with BuildSketch(Plane(origin=(4.11138133, 0, 0), x_dir=(0, 0, -1), z_dir=(1, 0, 0)), mode=Mode.PRIVATE) as cut_extrude_8_sk1:
        Polygon((-85.732826736, 19), (-75.732826736, 4), (-75.732826736, 19), align=None)
    cut_extrude_8_tool1 = extrude(cut_extrude_8_sk1.sketch, amount=-CUT_EXTRUDE_8_REACH, mode=Mode.PRIVATE) & part.part
    add(cut_extrude_8_tool1.solids().sort_by_distance((4.111381, 14, 79.06616))[0], mode=Mode.SUBTRACT)

    # 草图17 → 凸台-拉伸11 (add)
    # profile 1 of 4: a face of its own
    with SkipClean():  # the faces are left unmerged after this step: merging them gives an invalid solid
        with BuildSketch(Plane.XZ.offset(EXTRUDE_START)):
            with Locations(Location((-23.88861867, 64.732826736, 0), (0, 0, 90))):
                Circle(SKETCH_17_R)
            with Locations(Location((-23.88861867, 64.732826736, 0), (0, 0, 270))):
                Circle(SKETCH_17_R_2, mode=Mode.SUBTRACT)
        # profile 2 of 4: a face of its own
        with BuildSketch(Plane.XZ.offset(EXTRUDE_START)):
            with Locations(Location((26.11138133, 64.732826736, 0), (0, 0, 90))):
                Circle(SKETCH_17_R)
            with Locations(Location((26.11138133, 64.732826736, 0), (0, 0, 270))):
                Circle(SKETCH_17_R_2, mode=Mode.SUBTRACT)
        # profile 3 of 4: a face of its own
        with BuildSketch(Plane.XZ.offset(EXTRUDE_START)):
            with Locations(Location((26.11138133, -20.267173264, 0), (0, 0, 90))):
                Circle(SKETCH_17_R)
            with Locations(Location((26.11138133, -20.267173264, 0), (0, 0, 270))):
                Circle(SKETCH_17_R_2, mode=Mode.SUBTRACT)
        # profile 4 of 4: a face of its own
        with BuildSketch(Plane.XZ.offset(EXTRUDE_START)):
            with Locations(Location((-23.88861867, -20.267173264, 0), (0, 0, 90))):
                Circle(SKETCH_17_R)
            with Locations(Location((-23.88861867, -20.267173264, 0), (0, 0, 270))):
                Circle(SKETCH_17_R_2, mode=Mode.SUBTRACT)
        extrude(amount=-EXTRUDE_11_DEPTH)


solid = part.part
